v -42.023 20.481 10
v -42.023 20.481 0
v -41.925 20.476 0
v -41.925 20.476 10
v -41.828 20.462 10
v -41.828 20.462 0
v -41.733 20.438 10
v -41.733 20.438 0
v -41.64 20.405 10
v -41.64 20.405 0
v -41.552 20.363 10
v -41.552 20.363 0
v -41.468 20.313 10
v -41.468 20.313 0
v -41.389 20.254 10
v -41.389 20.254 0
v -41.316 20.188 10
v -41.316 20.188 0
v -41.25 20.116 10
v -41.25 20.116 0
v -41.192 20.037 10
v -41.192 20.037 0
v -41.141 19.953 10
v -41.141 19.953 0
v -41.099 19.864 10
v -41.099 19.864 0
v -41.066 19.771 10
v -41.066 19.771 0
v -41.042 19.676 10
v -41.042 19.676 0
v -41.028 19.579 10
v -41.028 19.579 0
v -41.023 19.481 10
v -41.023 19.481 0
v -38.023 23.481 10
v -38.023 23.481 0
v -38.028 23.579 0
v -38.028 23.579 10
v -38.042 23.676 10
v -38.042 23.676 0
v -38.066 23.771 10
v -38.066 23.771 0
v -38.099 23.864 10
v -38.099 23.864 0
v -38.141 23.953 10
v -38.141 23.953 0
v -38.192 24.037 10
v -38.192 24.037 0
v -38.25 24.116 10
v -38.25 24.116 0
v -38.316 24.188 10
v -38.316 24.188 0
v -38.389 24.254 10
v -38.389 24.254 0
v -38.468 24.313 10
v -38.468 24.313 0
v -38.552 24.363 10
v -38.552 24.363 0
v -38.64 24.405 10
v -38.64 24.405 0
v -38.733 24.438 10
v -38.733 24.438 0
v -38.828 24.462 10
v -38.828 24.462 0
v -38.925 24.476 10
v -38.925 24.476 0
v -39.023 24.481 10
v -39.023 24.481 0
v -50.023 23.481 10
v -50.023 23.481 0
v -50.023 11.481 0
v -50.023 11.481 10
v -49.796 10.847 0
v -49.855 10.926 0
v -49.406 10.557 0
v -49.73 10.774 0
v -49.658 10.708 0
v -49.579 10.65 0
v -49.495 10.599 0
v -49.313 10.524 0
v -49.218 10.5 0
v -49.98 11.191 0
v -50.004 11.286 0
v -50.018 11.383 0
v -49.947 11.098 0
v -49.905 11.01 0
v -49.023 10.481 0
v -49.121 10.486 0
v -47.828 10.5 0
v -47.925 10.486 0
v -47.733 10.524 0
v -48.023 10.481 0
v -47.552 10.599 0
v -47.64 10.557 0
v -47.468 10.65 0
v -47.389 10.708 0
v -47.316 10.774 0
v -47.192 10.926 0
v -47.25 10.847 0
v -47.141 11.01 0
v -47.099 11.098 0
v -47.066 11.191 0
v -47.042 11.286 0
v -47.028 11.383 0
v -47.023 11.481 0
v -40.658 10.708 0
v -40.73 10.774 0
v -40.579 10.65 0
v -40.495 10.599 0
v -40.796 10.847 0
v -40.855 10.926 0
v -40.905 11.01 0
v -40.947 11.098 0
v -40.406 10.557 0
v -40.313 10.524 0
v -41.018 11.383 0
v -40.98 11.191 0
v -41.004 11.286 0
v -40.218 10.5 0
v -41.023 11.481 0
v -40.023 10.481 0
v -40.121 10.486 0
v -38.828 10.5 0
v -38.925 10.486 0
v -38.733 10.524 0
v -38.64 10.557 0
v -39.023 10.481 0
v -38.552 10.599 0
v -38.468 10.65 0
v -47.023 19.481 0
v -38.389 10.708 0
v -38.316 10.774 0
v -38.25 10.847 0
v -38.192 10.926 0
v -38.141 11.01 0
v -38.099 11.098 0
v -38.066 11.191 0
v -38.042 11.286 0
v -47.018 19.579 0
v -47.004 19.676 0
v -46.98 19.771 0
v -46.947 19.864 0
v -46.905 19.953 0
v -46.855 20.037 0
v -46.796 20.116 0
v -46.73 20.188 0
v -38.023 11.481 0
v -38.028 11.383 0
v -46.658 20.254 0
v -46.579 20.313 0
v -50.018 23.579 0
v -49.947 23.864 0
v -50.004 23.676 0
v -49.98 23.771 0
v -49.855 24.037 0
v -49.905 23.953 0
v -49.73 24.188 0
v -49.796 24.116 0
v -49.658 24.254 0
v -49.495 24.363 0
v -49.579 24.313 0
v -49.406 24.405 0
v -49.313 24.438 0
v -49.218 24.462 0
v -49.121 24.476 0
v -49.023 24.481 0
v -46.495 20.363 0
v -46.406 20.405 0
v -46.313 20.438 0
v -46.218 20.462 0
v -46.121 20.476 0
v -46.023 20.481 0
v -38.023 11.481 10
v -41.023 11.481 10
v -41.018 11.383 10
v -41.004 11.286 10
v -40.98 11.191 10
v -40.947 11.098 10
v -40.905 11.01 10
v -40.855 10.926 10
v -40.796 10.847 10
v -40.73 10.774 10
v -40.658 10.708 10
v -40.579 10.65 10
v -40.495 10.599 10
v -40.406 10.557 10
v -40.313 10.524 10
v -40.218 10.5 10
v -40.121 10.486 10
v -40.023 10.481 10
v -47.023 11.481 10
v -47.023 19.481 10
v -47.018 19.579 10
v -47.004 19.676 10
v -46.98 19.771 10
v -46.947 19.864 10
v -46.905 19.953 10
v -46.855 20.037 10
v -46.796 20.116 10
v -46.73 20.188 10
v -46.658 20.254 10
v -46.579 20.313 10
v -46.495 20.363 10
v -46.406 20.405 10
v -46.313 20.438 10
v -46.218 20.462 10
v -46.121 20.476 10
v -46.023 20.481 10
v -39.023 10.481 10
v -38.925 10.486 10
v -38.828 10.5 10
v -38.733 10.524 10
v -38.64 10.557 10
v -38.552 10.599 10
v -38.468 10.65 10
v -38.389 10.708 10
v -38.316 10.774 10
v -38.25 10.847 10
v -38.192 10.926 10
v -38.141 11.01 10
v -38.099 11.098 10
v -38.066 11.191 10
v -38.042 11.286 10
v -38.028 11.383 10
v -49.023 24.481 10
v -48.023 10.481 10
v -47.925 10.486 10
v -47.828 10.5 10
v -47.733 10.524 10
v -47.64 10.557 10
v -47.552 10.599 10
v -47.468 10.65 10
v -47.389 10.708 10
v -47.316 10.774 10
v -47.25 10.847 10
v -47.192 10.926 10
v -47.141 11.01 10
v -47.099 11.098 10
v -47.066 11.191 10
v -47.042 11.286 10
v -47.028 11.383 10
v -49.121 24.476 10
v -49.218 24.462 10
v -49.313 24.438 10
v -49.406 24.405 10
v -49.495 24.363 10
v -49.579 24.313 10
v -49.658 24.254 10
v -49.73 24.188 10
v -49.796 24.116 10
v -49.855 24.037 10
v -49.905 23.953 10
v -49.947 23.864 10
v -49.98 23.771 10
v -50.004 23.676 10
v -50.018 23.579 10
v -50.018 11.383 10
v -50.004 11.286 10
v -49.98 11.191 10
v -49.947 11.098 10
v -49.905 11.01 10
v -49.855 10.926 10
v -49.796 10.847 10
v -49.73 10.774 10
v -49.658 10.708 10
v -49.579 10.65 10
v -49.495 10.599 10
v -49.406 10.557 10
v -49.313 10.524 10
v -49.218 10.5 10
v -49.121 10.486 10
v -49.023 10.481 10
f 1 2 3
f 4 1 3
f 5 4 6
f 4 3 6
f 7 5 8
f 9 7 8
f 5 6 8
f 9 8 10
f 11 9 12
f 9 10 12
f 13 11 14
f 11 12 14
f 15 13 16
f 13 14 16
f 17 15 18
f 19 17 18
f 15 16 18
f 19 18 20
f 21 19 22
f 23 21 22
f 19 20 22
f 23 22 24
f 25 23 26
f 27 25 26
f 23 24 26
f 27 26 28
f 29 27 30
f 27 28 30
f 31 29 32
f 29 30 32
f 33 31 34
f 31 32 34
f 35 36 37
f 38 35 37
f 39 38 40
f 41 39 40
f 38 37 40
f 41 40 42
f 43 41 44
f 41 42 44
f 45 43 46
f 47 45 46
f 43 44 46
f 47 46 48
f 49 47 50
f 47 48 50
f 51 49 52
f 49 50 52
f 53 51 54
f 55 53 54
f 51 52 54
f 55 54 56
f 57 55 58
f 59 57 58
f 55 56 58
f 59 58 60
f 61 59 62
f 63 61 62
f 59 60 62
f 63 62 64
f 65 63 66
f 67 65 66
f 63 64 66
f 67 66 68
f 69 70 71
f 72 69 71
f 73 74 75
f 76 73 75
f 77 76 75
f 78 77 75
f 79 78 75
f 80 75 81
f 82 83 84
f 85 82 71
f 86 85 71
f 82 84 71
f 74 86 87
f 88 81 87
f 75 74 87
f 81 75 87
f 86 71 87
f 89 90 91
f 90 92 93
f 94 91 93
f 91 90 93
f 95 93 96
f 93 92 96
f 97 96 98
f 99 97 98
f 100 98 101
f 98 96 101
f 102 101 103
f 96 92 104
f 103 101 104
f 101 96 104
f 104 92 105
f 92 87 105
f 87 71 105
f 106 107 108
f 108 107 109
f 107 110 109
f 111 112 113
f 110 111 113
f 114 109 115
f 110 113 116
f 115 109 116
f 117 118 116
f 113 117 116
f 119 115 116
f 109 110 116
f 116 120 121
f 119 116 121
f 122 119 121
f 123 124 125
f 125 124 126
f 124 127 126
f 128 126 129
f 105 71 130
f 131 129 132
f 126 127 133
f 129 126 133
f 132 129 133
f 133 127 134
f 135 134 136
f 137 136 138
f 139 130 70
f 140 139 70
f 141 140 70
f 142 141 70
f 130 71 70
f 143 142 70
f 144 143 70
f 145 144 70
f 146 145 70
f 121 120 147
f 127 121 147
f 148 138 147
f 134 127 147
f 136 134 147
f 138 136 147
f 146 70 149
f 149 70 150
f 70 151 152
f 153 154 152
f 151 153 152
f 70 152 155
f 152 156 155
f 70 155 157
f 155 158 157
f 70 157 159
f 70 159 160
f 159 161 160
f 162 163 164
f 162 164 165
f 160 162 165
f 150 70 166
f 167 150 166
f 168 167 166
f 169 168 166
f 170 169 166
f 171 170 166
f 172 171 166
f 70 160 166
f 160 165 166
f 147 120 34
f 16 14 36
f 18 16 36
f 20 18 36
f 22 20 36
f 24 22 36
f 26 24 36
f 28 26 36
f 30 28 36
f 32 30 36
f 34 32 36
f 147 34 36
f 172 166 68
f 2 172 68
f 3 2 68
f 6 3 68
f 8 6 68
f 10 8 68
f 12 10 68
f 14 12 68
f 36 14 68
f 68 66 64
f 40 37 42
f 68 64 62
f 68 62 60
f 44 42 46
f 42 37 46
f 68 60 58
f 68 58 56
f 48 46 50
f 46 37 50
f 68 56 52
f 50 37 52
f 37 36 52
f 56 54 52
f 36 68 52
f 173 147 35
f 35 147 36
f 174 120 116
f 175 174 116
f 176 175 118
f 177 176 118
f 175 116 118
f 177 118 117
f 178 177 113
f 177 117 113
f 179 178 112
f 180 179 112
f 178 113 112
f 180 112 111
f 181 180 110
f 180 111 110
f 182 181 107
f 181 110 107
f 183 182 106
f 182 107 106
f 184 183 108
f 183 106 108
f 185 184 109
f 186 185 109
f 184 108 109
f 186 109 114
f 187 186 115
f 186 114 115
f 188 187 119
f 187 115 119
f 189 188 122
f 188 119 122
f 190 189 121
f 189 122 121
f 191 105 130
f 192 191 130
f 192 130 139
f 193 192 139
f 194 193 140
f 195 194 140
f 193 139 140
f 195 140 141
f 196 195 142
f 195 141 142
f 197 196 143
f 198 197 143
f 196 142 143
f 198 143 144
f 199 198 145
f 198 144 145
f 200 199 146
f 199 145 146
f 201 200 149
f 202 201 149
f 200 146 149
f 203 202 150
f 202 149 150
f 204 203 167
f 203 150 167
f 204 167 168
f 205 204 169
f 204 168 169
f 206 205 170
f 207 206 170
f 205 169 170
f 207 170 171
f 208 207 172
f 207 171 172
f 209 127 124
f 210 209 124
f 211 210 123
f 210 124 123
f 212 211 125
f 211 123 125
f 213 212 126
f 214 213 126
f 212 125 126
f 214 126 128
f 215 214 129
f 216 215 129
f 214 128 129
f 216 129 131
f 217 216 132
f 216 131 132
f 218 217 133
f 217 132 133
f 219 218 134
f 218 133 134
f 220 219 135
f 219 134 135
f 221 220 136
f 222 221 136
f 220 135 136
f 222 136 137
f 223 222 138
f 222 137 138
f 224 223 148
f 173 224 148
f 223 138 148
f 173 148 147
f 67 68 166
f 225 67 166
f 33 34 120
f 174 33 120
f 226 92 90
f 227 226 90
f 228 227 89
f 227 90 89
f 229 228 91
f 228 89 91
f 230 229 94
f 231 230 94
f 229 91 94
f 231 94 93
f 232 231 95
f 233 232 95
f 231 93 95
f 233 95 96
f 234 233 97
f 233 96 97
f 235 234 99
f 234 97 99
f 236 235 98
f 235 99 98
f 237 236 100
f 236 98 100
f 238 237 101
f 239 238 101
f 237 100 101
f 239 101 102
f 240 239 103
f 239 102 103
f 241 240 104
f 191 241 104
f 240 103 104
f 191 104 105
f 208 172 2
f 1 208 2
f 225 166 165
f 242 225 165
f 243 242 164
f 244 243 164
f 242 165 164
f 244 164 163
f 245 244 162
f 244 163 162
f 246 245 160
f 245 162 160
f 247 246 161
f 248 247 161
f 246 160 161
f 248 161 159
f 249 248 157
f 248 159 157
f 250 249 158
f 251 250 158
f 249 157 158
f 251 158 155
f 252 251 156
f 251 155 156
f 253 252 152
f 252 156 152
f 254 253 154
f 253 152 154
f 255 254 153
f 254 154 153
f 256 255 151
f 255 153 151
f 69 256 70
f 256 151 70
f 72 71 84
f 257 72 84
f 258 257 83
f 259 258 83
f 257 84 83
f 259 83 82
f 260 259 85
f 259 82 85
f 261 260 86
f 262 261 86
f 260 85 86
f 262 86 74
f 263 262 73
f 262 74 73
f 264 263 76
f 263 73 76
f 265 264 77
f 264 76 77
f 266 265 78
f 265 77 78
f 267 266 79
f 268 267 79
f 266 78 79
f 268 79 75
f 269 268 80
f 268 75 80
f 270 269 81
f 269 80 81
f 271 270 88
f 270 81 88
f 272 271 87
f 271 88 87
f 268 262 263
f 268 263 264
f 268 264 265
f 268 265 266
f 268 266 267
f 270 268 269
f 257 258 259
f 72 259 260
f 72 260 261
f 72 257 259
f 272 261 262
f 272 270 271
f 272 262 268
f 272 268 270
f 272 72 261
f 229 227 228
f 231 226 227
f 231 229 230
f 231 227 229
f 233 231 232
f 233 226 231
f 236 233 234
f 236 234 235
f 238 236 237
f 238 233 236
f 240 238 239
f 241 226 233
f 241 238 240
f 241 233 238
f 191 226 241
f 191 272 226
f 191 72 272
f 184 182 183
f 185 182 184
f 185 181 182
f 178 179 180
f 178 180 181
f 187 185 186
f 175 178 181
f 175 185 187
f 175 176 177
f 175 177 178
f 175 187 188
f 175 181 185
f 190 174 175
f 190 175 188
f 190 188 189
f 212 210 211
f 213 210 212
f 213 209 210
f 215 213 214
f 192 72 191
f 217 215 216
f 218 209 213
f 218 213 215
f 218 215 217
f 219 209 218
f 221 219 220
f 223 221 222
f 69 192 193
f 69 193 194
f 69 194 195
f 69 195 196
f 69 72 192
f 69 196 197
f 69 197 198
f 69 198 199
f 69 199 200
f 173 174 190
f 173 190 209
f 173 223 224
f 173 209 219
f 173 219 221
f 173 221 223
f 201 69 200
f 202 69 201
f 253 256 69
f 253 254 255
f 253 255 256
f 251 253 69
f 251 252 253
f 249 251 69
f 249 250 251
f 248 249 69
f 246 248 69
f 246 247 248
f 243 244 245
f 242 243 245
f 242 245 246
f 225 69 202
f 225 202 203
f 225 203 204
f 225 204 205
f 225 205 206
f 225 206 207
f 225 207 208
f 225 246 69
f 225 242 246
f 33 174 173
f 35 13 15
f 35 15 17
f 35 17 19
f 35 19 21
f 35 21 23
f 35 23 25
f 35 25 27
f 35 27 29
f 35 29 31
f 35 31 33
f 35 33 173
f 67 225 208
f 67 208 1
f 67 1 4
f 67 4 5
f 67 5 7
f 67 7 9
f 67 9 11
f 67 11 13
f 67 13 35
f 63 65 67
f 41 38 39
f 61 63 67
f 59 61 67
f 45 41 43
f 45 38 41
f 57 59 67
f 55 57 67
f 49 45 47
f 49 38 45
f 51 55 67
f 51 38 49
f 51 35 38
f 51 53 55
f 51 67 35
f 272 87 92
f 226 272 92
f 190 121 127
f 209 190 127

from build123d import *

# Parameters (mm, degrees)
F1_DEPTH = 10


with BuildPart() as f1:
    # F0 (on Top) → F1 (new body)
    with BuildSketch(Plane.XY):
        with BuildLine():
            ThreePointArc((-47.023135, 19.481115), (-46.730242, 20.188222), (-46.023135, 20.481115))
            Line((-46.023135, 20.481115), (-42.023135, 20.481115))
            ThreePointArc((-42.023135, 20.481115), (-41.316028, 20.188222), (-41.023135, 19.481115))
            Line((-41.023135, 19.481115), (-41.023135, 11.481115))
            ThreePointArc((-41.023135, 11.481115), (-40.730242, 10.774009), (-40.023135, 10.481115))
            Line((-40.023135, 10.481115), (-39.023135, 10.481115))
            ThreePointArc((-39.023135, 10.481115), (-38.316028, 10.774009), (-38.023135, 11.481115))
            Line((-38.023135, 11.481115), (-38.023135, 23.481115))
            ThreePointArc((-38.023135, 23.481115), (-38.316028, 24.188222), (-39.023135, 24.481115))
            Line((-39.023135, 24.481115), (-49.023135, 24.481115))
            ThreePointArc((-49.023135, 24.481115), (-49.730242, 24.188222), (-50.023135, 23.481115))
            Line((-50.023135, 23.481115), (-50.023135, 11.481115))
            ThreePointArc((-50.023135, 11.481115), (-49.730242, 10.774009), (-49.023135, 10.481115))
            Line((-49.023135, 10.481115), (-48.023135, 10.481115))
            ThreePointArc((-48.023135, 10.481115), (-47.316028, 10.774009), (-47.023135, 11.481115))
            Line((-47.023135, 11.481115), (-47.023135, 19.481115))
        make_face()
    extrude(amount=F1_DEPTH)


solid = f1.part
